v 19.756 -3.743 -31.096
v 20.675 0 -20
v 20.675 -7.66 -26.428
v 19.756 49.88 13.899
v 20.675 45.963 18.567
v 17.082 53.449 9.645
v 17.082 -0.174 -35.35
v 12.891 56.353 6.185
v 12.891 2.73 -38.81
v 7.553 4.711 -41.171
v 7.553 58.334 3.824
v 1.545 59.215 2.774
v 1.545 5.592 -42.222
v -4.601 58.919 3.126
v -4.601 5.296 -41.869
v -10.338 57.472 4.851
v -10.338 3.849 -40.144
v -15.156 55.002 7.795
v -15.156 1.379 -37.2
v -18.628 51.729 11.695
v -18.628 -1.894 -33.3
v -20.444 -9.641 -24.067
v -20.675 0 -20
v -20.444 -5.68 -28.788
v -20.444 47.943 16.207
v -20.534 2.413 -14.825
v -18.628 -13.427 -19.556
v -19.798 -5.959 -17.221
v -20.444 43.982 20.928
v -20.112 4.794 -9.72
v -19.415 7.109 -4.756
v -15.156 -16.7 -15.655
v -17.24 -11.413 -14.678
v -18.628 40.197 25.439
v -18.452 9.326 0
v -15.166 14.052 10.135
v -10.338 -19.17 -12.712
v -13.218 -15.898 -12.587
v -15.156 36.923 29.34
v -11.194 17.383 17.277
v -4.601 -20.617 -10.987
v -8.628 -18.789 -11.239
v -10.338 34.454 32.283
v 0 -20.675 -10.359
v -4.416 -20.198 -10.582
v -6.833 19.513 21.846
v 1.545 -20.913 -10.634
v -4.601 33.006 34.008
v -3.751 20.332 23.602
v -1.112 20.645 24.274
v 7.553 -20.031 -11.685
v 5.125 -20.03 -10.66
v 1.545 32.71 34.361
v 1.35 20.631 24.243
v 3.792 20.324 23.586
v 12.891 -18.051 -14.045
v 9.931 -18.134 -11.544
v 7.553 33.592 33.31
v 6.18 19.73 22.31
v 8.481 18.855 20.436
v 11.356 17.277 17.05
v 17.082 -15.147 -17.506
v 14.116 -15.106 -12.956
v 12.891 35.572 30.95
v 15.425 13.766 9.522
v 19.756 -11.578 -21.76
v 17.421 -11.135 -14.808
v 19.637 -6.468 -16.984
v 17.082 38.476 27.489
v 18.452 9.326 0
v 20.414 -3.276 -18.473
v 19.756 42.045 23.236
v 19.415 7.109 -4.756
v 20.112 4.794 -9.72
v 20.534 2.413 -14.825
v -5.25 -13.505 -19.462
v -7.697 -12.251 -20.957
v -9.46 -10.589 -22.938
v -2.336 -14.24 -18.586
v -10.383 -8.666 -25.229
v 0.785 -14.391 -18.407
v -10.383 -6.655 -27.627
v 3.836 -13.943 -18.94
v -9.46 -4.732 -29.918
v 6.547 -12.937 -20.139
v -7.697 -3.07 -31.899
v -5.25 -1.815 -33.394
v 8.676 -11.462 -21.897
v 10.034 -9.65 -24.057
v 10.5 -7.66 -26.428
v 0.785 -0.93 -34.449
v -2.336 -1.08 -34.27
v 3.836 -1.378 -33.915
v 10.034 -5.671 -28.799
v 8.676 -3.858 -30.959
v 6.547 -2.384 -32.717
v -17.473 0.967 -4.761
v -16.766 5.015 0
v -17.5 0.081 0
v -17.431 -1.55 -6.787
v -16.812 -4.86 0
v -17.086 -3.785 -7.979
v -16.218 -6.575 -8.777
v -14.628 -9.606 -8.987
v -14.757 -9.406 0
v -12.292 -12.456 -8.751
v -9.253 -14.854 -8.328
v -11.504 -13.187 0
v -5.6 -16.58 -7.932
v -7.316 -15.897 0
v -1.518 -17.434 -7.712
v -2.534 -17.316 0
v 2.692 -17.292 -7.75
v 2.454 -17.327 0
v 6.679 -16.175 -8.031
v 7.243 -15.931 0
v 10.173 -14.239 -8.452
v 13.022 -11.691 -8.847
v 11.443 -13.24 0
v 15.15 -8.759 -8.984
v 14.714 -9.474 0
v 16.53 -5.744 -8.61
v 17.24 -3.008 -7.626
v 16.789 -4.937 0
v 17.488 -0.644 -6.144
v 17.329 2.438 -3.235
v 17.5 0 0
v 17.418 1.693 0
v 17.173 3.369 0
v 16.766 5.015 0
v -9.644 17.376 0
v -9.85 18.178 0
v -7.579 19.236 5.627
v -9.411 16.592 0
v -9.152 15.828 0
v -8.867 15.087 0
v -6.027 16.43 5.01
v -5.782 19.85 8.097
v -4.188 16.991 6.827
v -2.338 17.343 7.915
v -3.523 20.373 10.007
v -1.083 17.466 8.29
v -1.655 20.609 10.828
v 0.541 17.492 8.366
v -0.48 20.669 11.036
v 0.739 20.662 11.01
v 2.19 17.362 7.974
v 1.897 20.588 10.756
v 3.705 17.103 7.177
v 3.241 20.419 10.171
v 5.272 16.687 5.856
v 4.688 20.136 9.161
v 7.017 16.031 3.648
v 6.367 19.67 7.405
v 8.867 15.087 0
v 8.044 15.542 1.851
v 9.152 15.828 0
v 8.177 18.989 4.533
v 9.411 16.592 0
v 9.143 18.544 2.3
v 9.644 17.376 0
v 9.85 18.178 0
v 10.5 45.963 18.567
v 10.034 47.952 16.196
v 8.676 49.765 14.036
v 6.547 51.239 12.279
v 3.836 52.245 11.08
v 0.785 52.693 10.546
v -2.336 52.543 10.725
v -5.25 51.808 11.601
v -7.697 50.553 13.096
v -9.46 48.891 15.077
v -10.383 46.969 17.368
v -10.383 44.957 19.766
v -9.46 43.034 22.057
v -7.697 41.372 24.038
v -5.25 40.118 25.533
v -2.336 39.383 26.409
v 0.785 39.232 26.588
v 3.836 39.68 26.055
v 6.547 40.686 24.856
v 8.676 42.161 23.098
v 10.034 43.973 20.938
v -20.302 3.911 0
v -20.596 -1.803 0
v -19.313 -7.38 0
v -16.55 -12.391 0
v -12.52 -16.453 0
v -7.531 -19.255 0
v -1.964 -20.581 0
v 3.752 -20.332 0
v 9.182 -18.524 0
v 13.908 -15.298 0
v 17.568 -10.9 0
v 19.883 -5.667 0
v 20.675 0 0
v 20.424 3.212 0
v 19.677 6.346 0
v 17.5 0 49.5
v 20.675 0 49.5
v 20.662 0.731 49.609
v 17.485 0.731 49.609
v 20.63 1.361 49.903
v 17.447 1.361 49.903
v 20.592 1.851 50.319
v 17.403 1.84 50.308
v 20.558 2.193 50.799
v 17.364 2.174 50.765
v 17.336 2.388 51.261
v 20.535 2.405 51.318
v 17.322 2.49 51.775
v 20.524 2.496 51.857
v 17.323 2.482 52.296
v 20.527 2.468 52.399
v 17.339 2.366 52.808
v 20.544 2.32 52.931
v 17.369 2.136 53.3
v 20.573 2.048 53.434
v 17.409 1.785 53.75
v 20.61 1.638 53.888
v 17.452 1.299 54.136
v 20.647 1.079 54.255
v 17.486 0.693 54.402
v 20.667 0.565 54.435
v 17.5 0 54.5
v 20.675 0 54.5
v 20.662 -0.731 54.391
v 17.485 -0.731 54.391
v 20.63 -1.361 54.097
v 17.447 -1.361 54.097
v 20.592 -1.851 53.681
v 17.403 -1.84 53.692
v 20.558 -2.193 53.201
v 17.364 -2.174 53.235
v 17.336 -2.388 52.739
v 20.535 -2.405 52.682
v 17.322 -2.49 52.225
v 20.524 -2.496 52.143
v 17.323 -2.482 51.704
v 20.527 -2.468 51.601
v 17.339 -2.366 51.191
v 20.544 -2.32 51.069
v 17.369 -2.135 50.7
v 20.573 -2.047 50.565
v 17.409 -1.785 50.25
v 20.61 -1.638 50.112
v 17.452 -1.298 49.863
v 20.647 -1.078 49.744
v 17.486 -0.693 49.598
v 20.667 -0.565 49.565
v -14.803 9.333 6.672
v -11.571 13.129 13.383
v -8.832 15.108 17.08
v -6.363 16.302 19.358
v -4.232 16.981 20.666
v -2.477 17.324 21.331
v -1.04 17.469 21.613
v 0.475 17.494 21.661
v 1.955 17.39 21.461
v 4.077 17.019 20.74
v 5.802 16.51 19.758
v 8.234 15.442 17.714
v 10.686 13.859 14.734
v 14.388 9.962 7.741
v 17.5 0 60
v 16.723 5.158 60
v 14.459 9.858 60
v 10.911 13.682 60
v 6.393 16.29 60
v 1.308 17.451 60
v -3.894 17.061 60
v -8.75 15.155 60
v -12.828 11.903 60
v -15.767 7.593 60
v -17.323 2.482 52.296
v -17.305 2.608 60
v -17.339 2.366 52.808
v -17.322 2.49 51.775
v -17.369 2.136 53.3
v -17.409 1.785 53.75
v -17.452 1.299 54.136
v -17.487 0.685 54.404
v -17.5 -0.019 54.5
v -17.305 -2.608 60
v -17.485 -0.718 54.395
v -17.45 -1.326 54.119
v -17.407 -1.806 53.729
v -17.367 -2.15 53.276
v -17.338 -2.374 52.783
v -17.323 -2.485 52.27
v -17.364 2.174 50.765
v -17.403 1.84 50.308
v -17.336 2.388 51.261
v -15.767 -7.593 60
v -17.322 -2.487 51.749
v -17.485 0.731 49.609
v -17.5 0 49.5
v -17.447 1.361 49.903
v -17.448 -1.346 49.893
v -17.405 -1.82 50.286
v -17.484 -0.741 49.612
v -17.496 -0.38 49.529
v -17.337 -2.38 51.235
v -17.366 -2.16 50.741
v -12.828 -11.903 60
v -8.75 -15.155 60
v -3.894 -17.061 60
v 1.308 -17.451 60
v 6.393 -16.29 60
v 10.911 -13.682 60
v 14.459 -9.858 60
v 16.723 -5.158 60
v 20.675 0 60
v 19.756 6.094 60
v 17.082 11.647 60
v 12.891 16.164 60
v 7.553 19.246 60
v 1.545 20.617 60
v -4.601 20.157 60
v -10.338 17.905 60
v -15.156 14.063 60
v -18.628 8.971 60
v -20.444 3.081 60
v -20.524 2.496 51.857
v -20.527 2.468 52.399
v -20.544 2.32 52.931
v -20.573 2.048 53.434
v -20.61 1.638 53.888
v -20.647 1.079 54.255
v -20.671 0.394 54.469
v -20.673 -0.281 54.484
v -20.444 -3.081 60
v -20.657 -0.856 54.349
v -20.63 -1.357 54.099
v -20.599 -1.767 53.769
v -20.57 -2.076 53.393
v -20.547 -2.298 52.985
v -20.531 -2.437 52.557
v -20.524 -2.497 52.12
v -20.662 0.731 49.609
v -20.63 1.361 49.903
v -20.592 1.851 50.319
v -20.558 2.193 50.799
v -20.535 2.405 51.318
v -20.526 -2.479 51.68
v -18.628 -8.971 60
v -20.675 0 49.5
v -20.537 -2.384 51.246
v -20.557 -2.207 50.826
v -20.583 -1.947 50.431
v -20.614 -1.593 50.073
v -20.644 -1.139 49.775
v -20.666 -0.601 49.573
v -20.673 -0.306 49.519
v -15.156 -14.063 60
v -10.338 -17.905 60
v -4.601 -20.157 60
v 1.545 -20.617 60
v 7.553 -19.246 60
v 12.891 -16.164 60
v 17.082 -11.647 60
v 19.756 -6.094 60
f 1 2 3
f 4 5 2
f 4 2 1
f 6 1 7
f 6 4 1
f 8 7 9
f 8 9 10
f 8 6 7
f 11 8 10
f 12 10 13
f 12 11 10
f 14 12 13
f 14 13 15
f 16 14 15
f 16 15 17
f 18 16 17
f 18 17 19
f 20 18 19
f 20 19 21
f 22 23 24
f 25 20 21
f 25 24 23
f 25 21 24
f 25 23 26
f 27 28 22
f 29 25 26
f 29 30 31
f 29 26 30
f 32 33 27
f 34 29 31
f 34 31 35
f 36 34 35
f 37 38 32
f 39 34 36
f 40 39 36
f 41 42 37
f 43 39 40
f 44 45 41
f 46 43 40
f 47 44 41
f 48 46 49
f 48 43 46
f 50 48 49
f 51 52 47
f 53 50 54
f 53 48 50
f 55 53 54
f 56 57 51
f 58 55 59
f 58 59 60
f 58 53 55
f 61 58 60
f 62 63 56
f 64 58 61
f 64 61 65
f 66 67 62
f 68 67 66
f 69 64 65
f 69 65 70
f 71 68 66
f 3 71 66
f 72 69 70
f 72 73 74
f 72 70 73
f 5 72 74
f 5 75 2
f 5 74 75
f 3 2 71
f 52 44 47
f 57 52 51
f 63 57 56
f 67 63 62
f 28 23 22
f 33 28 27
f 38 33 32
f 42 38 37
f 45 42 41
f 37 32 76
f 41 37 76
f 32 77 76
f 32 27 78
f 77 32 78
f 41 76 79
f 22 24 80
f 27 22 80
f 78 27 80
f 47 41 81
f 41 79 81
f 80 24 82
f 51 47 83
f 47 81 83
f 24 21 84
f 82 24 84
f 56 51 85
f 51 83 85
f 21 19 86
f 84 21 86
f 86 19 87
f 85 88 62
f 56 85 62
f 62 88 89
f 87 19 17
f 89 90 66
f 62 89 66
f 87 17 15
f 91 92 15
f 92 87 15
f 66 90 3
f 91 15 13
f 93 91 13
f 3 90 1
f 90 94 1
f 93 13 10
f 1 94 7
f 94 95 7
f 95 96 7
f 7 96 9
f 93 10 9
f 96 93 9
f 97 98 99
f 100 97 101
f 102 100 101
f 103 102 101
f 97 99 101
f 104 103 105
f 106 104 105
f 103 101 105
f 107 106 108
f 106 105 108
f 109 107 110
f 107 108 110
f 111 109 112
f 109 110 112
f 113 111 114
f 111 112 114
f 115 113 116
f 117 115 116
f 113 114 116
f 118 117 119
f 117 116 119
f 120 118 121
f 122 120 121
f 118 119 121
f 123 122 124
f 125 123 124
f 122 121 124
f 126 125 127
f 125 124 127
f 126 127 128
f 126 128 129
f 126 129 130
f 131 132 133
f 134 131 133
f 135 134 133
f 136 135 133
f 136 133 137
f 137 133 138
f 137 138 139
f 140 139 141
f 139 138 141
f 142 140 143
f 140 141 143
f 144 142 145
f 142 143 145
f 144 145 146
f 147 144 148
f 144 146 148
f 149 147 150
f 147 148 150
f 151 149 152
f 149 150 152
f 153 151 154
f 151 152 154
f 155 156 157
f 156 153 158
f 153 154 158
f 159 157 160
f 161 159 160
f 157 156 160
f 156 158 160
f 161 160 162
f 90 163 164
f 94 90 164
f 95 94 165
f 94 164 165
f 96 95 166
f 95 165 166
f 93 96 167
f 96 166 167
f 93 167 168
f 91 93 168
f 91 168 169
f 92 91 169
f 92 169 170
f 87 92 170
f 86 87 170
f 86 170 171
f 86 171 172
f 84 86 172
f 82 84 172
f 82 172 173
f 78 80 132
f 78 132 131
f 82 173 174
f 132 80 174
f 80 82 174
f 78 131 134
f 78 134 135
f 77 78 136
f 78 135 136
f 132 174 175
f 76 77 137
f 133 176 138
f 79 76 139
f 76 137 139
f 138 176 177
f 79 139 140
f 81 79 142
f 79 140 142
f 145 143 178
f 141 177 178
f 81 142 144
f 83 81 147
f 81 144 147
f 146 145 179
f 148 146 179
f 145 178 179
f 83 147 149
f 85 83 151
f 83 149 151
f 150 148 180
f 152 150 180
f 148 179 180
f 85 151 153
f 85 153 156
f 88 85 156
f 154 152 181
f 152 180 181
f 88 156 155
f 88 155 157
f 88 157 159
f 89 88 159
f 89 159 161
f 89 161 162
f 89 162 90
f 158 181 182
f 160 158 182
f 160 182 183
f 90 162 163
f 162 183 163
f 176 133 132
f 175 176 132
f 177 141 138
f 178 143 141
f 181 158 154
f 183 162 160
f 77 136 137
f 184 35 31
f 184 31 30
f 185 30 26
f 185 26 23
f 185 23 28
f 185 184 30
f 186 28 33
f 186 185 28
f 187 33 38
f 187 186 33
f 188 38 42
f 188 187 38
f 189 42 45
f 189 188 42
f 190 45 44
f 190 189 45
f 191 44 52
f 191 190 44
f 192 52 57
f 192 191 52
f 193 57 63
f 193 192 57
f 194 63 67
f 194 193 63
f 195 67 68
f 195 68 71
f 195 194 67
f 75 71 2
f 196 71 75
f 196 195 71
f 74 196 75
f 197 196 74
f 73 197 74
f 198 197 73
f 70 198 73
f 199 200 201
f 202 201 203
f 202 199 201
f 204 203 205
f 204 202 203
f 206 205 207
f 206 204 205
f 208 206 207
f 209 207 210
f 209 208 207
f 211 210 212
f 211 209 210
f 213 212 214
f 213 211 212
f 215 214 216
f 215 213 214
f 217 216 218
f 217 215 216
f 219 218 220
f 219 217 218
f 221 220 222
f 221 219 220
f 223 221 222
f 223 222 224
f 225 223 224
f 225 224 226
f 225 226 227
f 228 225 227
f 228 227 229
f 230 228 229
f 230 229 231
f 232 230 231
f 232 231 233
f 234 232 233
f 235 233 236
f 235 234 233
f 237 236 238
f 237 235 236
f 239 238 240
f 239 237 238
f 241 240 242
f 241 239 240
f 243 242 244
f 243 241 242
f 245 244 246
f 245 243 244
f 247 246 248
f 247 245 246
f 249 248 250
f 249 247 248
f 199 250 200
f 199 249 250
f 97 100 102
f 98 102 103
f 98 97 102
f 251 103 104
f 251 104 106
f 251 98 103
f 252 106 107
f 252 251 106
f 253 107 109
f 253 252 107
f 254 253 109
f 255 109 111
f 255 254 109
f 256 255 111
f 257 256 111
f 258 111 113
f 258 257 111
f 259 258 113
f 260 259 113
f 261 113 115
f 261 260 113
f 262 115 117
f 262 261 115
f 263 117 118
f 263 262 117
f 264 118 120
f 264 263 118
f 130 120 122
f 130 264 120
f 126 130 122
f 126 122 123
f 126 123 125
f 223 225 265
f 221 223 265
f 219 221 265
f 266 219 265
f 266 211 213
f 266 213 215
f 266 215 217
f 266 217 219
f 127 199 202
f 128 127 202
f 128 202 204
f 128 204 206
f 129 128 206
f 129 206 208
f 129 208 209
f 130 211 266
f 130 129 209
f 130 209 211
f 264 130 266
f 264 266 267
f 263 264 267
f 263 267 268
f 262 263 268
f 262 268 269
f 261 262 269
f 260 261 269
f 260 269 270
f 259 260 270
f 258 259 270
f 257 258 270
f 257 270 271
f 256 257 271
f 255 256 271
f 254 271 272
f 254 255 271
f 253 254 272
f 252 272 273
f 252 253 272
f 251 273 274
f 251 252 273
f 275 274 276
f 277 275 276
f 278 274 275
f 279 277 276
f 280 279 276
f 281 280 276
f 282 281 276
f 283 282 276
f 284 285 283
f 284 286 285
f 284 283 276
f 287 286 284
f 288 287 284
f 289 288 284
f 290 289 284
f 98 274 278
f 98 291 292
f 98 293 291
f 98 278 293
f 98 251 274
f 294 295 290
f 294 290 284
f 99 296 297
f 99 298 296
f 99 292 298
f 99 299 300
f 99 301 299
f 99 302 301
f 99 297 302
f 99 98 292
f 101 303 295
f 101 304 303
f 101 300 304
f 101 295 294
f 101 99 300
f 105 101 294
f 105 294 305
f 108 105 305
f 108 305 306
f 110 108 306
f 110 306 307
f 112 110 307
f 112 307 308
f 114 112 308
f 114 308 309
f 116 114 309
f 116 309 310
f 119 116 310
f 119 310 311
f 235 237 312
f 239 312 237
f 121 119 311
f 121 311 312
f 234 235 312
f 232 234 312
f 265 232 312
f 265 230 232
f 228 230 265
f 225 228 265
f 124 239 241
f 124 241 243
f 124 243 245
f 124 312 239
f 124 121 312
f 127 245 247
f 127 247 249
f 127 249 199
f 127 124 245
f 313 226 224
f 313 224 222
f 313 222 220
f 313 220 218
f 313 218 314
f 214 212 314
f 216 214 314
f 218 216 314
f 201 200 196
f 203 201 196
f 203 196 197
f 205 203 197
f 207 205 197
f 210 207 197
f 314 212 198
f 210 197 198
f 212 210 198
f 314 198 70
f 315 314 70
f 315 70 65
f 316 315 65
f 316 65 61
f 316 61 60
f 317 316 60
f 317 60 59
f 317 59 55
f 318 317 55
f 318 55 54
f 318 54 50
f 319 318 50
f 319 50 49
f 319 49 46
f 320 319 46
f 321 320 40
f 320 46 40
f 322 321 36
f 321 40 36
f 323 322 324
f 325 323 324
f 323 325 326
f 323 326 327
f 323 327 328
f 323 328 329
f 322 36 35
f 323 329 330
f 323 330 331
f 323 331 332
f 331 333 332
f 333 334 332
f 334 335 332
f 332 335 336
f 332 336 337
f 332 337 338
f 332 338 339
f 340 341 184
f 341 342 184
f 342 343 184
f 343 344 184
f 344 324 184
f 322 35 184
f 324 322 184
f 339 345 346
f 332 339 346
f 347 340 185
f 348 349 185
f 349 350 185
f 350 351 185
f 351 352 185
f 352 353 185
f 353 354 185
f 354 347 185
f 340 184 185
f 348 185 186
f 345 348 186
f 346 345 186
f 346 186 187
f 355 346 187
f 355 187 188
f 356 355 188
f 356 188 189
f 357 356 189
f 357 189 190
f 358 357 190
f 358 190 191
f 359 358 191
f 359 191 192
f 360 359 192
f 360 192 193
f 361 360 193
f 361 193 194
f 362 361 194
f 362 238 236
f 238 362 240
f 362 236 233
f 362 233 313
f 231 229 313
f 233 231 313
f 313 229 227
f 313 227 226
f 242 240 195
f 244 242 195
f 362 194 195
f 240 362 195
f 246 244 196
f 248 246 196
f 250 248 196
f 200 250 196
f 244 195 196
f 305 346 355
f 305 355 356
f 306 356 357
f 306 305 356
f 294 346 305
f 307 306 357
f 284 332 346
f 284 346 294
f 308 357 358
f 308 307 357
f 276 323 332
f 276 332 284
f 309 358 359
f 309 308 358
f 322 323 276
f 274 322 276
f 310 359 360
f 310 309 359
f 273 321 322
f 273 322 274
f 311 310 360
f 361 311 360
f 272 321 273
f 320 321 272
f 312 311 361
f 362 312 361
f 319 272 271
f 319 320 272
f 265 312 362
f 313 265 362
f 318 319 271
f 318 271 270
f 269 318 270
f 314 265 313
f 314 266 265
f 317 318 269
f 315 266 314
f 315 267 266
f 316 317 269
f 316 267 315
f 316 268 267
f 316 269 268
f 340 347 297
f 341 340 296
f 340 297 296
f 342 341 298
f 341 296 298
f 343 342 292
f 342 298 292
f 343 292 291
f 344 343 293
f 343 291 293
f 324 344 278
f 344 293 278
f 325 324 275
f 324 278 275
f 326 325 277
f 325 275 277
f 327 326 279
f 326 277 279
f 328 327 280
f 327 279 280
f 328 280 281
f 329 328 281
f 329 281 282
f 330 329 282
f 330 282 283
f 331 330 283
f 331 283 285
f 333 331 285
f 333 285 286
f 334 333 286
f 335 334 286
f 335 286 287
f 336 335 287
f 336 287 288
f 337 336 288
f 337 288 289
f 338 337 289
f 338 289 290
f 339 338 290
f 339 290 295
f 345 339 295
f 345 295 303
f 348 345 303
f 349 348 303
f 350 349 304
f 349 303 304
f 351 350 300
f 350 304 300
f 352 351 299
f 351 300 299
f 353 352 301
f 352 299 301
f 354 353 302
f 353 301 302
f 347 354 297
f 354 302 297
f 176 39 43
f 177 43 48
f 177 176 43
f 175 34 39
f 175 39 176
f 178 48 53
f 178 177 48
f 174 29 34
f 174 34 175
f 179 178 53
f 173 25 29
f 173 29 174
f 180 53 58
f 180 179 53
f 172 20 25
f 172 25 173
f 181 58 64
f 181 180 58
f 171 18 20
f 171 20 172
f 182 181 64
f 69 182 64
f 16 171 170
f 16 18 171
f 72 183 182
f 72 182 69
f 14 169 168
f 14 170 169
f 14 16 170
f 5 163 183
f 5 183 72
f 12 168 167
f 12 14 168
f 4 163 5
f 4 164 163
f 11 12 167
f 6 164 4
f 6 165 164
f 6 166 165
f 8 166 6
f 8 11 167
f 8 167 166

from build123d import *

# Parameters (mm, degrees)
SKETCH1_R               = 20.675
SKETCH1_R_2             = 17.5
BOSS_EXTRUDE1_DEPTH     = 60
SKETCH3_R               = 20.675
SKETCH3_R_2             = 10.5
BOSS_EXTRUDE2_DEPTH     = 70
BOSS_EXTRUDE5_REACH     = 44.266
SKETCH1_4_R             = 20.675
SKETCH1_4_R_2           = 17.5
SKETCH6_R               = 10.5
CUT_EXTRUDE1_DEPTH      = 37.812904316
CUT_EXTRUDE1_DEPTH_BACK = 91.360900294
SKETCH7_R               = 2.5
CUT_EXTRUDE2_DEPTH      = 21.675
CUT_EXTRUDE2_DEPTH_BACK = 21.675


with BuildPart() as part:
    # Sketch1 → Boss-Extrude1 (new body)
    with BuildSketch(Plane.XY):
        Circle(SKETCH1_R)
        Circle(SKETCH1_R_2, mode=Mode.SUBTRACT)
    extrude(amount=BOSS_EXTRUDE1_DEPTH)

    # Sketch3 → Boss-Extrude2 (add)
    with BuildSketch(Plane(origin=(0, 45.962666587, 18.567256581), x_dir=(1, 0, 0), z_dir=(0, 0.766044443, 0.64278761))):
        Circle(SKETCH3_R)
        Circle(SKETCH3_R_2, mode=Mode.SUBTRACT)
    extrude(amount=-BOSS_EXTRUDE2_DEPTH)

    # Sketch1<4> → Boss-Extrude5 (add, up to next)
    with BuildSketch(Plane.XY, mode=Mode.PRIVATE) as boss_extrude5_sk1:
        Circle(SKETCH1_4_R)
        Circle(SKETCH1_4_R_2, mode=Mode.SUBTRACT)
    boss_extrude5_tool1 = extrude(boss_extrude5_sk1.sketch, amount=-BOSS_EXTRUDE5_REACH, mode=Mode.PRIVATE) - part.part
    add(boss_extrude5_tool1.solids().sort_by_distance((-20.090223, 0, 0))[0])

    # Sketch6 → Cut-Extrude1 (cut, two sides)
    with BuildSketch(Plane(origin=(0, 36.114589057, 30.303738358), x_dir=(1, 0, 0), z_dir=(0, 0.766044443, 0.64278761))) as cut_extrude1_sk:
        with Locations((0, 15.320888862)):
            Circle(SKETCH6_R)
    extrude(amount=CUT_EXTRUDE1_DEPTH, mode=Mode.SUBTRACT)
    extrude(cut_extrude1_sk.sketch, amount=-CUT_EXTRUDE1_DEPTH_BACK, mode=Mode.SUBTRACT)

    # Sketch7 → Cut-Extrude2 (cut, two sides)
    with BuildSketch(Plane(origin=(0, 0, 0), x_dir=(0, 0, -1), z_dir=(1, 0, 0))) as cut_extrude2_sk:
        with Locations((-52, 0)):
            Circle(SKETCH7_R)
    extrude(amount=CUT_EXTRUDE2_DEPTH, mode=Mode.SUBTRACT)
    extrude(cut_extrude2_sk.sketch, amount=-CUT_EXTRUDE2_DEPTH_BACK, mode=Mode.SUBTRACT)


solid = part.part
